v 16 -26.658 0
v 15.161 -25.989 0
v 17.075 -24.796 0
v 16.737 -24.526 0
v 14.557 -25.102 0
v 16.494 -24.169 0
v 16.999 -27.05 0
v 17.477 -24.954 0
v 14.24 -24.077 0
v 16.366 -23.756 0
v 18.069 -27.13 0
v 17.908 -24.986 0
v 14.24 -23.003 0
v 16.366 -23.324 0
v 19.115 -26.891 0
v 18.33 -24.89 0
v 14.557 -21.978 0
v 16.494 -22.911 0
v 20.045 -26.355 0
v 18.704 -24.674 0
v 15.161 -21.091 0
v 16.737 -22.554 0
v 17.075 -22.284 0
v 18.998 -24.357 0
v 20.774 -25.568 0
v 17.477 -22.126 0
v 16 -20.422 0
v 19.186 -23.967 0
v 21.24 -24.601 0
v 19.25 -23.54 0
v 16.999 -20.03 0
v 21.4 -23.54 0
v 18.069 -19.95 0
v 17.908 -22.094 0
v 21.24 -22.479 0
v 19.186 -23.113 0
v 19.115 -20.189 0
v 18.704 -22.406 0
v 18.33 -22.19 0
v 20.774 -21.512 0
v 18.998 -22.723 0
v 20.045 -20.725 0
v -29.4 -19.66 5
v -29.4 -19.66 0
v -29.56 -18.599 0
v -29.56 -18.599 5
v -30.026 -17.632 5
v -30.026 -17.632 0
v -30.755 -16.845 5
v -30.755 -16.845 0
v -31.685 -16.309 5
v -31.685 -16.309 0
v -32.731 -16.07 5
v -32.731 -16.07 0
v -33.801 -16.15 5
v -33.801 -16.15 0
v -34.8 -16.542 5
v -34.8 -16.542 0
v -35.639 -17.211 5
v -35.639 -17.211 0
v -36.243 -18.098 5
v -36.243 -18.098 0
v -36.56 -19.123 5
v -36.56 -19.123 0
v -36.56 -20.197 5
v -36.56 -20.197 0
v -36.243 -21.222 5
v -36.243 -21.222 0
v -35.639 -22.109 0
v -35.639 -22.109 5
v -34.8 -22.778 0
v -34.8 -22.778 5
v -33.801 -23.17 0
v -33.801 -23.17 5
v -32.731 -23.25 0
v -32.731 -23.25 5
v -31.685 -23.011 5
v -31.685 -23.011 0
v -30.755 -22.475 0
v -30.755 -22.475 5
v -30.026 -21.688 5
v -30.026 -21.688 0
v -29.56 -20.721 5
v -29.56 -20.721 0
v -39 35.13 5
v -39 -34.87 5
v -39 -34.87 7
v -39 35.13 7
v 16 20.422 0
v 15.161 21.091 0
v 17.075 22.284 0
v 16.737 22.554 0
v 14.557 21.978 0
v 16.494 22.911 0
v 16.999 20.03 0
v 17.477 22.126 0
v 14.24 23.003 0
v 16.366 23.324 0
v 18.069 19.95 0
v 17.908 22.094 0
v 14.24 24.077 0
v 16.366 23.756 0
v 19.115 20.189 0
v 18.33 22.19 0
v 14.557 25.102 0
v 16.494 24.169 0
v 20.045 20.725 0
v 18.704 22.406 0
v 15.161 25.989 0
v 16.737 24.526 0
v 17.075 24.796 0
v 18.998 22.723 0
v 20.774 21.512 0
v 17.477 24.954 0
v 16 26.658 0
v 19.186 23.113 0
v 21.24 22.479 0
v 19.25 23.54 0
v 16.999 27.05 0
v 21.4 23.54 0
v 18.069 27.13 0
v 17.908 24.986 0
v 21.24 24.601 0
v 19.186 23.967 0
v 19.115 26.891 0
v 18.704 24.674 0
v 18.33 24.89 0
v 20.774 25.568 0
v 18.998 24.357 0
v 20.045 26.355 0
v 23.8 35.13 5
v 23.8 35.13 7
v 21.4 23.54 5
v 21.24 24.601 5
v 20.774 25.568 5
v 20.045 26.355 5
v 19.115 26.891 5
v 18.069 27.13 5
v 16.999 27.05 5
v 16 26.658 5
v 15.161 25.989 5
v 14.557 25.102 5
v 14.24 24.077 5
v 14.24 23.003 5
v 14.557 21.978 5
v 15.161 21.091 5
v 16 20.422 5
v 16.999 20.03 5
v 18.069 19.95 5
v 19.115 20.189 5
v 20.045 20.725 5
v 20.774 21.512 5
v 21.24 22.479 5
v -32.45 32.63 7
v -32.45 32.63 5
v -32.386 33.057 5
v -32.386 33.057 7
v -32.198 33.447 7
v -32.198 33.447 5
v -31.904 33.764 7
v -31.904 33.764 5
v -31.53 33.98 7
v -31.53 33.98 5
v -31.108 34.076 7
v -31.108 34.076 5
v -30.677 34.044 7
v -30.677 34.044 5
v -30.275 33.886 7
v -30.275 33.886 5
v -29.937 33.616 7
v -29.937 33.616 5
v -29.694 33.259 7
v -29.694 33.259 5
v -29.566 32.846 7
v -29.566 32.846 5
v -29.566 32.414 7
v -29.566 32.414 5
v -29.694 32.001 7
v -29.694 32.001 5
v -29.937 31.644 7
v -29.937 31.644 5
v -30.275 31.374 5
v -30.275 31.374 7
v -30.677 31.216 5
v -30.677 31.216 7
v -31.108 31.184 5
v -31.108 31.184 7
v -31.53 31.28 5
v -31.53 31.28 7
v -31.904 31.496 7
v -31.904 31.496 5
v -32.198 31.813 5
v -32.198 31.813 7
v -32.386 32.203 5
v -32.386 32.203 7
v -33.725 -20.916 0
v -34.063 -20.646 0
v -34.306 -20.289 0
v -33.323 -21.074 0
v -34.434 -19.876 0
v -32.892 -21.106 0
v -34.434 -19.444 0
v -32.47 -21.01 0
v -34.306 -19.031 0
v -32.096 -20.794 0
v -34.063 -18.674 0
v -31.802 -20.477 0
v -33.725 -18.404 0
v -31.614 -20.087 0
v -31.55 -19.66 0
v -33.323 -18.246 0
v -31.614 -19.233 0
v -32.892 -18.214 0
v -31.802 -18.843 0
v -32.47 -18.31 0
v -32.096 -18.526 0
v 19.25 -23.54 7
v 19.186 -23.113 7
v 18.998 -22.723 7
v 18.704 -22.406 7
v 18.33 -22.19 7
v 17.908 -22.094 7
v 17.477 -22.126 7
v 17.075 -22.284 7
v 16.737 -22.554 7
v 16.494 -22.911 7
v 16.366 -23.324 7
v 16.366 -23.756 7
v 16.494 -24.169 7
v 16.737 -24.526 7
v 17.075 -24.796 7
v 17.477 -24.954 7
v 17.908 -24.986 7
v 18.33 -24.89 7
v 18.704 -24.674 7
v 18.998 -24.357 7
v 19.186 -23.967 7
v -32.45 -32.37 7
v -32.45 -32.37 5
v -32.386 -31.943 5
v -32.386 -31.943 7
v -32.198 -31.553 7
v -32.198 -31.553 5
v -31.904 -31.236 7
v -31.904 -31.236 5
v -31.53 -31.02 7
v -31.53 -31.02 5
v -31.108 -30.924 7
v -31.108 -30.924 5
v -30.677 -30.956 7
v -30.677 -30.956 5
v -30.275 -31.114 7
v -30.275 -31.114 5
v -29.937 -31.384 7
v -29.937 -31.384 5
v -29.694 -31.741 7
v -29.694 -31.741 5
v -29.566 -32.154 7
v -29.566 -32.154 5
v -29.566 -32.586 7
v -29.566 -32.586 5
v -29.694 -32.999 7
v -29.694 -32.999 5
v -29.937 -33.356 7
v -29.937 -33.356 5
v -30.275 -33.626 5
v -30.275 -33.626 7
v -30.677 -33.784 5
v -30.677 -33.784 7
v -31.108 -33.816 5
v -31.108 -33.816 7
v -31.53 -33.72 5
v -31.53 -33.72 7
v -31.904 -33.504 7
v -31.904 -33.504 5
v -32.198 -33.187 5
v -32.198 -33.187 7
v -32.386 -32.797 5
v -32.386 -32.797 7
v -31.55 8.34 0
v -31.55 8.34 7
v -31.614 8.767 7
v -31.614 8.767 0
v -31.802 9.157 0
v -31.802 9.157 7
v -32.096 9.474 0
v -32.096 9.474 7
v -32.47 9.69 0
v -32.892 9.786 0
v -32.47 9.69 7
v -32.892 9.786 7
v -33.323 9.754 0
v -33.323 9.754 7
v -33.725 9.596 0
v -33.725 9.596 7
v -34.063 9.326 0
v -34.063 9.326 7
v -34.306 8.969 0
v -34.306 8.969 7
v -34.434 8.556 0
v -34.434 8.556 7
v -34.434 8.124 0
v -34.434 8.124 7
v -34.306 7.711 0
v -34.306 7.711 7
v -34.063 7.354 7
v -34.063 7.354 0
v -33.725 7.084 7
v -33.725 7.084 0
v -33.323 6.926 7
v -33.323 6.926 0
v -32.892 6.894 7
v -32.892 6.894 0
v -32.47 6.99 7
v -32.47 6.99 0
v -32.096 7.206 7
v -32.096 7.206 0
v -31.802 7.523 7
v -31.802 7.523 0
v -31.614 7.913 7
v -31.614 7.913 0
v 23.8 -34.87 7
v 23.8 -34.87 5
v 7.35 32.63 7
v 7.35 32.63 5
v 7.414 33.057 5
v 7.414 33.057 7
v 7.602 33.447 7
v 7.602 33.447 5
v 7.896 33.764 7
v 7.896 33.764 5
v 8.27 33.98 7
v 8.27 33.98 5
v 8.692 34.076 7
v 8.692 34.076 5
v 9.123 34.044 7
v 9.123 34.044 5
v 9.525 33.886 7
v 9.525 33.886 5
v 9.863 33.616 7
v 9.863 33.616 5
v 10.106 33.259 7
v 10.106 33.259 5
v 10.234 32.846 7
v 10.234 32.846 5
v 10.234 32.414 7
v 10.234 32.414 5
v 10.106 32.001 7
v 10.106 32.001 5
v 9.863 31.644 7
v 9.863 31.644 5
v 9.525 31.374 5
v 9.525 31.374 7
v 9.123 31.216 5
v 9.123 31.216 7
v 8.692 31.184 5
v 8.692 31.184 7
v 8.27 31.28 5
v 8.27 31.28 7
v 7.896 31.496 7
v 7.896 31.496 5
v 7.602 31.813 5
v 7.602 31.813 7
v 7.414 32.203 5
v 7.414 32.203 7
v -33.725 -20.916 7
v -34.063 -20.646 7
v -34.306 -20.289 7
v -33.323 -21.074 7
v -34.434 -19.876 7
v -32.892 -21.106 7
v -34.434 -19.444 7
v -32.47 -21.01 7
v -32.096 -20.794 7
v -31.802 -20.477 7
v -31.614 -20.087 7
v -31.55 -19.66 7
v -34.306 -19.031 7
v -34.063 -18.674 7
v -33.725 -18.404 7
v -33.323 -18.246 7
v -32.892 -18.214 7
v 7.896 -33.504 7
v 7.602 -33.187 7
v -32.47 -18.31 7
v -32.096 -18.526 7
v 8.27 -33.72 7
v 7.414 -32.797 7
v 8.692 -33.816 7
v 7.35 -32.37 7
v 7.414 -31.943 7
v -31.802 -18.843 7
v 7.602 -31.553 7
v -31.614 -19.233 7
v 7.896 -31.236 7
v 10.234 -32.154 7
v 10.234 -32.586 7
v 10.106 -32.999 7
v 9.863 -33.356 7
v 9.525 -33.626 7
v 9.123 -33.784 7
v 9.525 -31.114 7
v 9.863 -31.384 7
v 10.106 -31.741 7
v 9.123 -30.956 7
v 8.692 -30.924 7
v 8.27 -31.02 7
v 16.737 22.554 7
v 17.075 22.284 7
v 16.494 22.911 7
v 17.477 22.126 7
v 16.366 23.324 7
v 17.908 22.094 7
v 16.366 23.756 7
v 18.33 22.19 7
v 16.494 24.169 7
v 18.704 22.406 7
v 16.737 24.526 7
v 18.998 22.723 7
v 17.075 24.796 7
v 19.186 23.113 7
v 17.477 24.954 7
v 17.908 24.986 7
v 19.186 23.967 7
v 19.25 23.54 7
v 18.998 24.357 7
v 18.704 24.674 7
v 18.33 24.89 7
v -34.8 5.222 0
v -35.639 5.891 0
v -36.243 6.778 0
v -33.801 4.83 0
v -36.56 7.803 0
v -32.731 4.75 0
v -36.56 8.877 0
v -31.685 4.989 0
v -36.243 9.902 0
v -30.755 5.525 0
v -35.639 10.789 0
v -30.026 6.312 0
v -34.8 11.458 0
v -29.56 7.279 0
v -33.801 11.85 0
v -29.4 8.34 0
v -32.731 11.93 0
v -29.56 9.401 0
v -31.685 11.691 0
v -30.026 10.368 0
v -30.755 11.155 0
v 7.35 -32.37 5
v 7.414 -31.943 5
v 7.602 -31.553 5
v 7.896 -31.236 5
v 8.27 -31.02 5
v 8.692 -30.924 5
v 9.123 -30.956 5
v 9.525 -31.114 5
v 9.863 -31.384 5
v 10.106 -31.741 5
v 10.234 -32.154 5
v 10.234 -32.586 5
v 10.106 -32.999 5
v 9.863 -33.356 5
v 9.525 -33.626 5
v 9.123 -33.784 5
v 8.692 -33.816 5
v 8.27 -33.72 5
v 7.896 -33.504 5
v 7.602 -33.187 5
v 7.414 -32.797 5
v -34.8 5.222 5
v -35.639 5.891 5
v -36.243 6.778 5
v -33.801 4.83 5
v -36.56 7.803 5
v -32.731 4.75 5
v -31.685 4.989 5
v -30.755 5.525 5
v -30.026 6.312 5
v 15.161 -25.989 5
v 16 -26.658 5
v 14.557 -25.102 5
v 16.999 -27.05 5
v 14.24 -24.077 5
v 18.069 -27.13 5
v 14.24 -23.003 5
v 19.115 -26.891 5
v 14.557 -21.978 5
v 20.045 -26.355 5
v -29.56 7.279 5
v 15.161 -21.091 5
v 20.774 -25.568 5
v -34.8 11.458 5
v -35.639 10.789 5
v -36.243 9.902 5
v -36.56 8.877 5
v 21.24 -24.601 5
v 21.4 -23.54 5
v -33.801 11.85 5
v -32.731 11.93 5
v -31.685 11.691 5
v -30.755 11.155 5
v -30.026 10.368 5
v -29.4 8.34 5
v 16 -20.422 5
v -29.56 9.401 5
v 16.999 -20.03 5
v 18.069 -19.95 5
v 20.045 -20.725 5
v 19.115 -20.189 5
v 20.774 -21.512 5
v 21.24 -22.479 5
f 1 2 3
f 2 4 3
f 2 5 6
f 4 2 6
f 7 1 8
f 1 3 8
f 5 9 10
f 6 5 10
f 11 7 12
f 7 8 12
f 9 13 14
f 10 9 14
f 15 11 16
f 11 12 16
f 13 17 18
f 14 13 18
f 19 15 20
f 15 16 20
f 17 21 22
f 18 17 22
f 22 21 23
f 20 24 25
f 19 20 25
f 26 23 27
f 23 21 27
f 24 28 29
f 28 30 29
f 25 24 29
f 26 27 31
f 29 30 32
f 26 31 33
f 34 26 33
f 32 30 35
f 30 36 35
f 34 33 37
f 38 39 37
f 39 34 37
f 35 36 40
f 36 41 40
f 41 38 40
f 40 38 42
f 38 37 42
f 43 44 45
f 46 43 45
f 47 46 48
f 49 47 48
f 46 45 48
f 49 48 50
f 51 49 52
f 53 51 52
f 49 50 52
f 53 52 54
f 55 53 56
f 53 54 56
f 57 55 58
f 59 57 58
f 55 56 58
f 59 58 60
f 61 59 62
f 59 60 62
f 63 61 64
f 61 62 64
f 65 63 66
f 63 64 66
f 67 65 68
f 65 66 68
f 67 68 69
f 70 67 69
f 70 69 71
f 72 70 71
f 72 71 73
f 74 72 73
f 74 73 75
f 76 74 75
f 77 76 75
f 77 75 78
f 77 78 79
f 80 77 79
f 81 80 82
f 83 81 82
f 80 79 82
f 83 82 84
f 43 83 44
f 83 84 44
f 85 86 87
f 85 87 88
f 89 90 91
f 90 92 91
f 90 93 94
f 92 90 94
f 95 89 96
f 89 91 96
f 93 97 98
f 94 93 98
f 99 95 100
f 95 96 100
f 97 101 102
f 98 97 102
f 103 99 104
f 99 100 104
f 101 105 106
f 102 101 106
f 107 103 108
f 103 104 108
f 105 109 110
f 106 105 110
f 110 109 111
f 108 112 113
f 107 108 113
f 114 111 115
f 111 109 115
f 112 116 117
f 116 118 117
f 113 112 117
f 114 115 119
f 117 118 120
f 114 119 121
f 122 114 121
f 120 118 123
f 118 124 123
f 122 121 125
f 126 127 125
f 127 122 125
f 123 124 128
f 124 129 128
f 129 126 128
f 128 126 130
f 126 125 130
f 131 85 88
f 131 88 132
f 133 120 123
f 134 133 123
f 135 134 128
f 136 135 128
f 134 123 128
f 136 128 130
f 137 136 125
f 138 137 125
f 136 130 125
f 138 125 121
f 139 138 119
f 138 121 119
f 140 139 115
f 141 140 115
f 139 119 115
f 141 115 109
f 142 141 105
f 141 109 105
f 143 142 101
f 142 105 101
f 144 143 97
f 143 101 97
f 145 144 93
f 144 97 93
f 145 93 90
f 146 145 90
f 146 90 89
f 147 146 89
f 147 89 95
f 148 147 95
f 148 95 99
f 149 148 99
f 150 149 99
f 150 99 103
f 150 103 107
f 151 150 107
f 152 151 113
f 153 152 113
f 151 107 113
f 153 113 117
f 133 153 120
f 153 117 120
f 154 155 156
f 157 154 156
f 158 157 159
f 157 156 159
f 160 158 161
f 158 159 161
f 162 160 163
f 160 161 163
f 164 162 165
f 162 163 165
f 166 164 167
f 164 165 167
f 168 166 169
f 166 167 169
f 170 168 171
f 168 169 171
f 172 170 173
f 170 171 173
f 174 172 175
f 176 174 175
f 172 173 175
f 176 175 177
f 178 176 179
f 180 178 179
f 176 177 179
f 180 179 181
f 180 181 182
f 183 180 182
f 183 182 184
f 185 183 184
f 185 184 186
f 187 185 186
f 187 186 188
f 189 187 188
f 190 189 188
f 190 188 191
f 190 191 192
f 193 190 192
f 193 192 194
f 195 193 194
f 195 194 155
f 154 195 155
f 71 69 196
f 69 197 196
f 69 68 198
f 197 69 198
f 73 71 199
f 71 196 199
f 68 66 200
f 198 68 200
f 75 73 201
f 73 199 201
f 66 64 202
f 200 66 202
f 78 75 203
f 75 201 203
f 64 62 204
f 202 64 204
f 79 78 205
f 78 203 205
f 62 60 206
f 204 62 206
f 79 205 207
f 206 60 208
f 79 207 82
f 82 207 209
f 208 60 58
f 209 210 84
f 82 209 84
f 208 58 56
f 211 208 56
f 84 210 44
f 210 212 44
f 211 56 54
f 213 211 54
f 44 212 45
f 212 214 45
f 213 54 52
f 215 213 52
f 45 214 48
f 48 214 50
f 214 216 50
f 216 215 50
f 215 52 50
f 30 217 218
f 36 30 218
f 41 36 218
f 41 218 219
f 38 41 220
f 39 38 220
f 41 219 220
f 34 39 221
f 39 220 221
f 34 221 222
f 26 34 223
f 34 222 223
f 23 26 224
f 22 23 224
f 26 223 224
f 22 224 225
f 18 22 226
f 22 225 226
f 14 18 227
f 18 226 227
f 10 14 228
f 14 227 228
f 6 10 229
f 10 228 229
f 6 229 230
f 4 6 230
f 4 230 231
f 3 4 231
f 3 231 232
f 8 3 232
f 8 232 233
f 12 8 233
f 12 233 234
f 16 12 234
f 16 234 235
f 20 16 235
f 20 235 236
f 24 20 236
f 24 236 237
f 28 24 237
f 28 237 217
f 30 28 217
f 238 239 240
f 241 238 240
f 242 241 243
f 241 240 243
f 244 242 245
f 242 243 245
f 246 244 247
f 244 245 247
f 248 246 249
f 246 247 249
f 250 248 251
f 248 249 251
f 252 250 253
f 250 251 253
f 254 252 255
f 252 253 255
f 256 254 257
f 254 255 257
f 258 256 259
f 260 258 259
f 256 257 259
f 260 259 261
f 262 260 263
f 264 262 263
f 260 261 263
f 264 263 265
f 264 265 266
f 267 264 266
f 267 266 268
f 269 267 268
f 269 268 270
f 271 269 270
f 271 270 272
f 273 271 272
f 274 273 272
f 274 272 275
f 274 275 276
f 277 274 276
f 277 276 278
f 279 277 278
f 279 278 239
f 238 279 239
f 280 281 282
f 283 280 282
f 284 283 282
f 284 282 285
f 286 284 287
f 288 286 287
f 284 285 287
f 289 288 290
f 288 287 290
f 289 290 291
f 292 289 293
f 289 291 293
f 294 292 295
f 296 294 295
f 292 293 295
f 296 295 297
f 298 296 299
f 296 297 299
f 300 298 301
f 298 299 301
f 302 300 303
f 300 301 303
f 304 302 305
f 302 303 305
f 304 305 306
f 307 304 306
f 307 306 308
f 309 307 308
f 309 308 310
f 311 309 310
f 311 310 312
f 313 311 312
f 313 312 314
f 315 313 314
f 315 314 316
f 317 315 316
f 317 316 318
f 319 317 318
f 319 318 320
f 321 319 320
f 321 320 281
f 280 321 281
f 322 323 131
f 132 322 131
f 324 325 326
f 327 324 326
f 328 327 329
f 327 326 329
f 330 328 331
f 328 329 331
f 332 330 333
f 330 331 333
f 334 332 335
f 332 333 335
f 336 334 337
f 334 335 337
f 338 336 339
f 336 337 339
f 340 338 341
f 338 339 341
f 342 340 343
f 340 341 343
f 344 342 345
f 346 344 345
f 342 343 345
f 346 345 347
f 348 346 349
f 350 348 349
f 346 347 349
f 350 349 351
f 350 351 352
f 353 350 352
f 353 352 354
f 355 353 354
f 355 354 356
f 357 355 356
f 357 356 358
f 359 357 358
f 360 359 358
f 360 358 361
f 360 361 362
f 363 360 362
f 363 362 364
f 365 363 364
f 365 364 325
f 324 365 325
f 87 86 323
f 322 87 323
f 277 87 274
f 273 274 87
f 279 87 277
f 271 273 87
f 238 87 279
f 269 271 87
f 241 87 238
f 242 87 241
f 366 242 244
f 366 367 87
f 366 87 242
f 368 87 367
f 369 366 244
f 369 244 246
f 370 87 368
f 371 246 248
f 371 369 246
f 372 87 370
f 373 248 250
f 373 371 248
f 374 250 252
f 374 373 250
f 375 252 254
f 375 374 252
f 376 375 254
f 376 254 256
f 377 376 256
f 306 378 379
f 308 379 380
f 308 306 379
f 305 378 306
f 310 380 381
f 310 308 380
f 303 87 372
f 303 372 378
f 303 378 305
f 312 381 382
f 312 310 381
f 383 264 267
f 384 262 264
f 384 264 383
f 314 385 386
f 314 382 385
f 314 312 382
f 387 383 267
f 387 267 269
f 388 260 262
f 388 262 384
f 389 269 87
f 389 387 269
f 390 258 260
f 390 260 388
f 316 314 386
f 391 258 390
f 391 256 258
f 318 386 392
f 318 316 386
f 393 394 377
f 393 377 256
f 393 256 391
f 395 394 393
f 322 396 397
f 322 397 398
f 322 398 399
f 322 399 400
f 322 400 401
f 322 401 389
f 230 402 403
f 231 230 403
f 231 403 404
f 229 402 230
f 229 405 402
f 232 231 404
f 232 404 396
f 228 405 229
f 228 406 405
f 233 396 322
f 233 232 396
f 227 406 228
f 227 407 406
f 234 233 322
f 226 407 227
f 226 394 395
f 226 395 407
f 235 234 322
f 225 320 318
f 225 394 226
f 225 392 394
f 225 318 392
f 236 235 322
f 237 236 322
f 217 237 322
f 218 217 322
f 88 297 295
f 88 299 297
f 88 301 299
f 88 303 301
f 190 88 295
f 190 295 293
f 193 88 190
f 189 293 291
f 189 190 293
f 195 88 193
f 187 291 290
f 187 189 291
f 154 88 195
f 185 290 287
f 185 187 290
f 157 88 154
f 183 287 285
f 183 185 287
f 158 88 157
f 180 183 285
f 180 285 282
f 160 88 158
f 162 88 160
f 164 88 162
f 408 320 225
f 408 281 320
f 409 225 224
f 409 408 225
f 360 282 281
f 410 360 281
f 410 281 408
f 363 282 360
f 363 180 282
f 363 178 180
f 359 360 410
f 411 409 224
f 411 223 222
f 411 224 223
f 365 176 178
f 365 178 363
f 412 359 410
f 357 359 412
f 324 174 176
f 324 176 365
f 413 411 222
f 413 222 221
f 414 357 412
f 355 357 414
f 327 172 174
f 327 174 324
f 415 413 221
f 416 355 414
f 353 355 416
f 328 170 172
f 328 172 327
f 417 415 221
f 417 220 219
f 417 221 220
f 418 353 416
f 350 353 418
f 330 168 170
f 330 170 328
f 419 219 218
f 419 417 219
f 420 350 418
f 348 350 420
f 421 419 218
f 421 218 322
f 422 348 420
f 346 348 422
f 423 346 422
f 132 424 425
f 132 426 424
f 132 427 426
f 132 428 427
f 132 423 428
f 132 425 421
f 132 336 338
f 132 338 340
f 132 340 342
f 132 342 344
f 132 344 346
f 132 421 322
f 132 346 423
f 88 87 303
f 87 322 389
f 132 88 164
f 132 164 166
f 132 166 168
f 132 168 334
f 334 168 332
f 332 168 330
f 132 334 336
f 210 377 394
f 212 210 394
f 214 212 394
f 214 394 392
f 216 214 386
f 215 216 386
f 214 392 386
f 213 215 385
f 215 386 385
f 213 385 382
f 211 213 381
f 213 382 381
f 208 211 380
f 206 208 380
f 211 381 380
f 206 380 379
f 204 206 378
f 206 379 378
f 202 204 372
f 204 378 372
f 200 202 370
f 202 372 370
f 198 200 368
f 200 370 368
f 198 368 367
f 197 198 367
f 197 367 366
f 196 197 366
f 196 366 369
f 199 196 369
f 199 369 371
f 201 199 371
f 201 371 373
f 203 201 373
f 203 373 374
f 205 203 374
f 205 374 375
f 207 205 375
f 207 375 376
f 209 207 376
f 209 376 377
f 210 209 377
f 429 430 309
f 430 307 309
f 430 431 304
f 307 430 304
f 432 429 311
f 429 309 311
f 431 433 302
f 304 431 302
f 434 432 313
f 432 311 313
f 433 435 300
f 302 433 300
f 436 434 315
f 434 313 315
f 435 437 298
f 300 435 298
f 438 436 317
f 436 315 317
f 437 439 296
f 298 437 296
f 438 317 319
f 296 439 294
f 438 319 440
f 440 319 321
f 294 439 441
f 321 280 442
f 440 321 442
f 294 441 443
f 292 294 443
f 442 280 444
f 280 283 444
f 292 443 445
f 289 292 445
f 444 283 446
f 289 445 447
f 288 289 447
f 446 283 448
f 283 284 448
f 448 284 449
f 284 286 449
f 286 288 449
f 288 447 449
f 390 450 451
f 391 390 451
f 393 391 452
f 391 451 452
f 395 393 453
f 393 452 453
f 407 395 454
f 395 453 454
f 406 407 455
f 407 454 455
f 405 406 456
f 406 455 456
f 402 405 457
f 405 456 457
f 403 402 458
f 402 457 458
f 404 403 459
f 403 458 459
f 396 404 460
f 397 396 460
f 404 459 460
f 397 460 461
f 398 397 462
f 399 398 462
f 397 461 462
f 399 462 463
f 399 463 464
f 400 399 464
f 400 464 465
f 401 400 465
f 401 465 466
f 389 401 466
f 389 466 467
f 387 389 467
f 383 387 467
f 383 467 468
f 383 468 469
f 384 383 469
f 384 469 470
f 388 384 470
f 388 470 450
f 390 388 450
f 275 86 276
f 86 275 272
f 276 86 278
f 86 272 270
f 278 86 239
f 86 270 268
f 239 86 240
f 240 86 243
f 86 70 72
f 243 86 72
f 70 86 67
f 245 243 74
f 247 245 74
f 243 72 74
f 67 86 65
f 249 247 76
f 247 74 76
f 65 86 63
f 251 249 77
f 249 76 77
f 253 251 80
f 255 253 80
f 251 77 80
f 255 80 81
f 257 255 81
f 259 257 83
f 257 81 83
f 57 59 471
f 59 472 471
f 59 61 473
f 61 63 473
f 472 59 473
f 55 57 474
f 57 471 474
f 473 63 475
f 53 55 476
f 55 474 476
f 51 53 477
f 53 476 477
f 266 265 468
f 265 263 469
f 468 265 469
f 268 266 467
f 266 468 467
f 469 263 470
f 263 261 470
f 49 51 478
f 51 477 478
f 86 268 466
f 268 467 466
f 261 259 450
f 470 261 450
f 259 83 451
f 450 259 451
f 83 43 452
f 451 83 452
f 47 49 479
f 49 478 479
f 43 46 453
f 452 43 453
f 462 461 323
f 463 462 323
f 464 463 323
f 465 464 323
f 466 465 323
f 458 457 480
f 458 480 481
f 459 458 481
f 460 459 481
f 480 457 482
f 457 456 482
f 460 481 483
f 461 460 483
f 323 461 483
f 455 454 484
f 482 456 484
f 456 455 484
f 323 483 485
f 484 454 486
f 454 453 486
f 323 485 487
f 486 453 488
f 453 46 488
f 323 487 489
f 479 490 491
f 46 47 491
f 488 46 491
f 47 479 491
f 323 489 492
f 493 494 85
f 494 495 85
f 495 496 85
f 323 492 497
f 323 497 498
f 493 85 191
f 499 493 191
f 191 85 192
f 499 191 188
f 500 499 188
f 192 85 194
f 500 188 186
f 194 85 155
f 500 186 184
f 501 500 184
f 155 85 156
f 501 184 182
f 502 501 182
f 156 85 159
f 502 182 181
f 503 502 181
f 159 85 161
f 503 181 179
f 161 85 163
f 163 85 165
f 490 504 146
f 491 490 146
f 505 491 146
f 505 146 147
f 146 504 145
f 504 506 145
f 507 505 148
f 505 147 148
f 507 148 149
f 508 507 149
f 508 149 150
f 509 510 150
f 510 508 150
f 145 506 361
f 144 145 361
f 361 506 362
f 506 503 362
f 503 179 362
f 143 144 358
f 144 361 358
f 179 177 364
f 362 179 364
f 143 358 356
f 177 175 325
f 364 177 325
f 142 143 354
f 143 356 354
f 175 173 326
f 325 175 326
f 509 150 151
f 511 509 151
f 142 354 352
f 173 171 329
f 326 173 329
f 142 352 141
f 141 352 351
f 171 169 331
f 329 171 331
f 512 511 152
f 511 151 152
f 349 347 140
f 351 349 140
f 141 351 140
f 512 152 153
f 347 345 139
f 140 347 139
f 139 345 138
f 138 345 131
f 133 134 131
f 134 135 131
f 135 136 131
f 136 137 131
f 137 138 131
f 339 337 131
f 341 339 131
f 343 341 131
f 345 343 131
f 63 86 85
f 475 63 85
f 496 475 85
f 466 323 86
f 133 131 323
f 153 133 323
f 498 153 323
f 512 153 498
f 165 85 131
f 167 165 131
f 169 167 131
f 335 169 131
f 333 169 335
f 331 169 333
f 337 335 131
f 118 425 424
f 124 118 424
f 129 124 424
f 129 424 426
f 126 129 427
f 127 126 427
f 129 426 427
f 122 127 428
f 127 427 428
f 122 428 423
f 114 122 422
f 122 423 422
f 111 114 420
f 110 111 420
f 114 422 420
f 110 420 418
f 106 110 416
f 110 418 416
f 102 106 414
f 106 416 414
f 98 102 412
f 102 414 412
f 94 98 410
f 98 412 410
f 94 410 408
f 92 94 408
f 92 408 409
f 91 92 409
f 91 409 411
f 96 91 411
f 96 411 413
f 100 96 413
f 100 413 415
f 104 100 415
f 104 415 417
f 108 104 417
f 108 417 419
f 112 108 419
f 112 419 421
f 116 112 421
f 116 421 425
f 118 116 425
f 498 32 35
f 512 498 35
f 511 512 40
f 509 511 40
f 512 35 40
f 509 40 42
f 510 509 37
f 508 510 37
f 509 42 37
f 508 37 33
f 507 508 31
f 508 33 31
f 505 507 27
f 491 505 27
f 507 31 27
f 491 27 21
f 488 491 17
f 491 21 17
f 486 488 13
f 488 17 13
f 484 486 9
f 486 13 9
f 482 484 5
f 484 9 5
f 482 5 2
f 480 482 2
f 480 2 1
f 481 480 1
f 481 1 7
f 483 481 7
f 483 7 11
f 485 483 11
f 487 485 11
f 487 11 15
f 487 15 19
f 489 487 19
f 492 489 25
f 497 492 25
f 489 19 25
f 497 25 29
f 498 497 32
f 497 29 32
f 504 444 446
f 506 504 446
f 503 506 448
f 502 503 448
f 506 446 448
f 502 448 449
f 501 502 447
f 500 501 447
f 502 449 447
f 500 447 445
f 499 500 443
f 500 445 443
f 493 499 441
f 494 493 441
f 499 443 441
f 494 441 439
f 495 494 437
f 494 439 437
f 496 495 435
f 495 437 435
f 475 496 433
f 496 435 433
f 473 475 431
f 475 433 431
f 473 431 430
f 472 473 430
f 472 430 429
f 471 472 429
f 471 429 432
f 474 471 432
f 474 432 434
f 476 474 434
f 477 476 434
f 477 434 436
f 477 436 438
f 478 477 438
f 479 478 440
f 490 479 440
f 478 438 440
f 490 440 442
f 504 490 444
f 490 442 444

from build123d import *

# Parameters (mm, degrees)
SKETCH1_R                 = 3.6
SKETCH1_R_2               = 1.6
BOSS_EXTRUDE1_DEPTH       = 5
SKETCH2_W                 = 62.8
SKETCH2_H                 = 70
BOSS_EXTRUDE2_DEPTH       = 2
F_1_0MM_DOWEL_HOLE2_D     = 2.9
F_1_0MM_DOWEL_HOLE2_DEPTH = 9.128752102
F_1_0MM_DOWEL_HOLE2_TIP   = 0.871247898
F_1_0MM_DOWEL_HOLE3_D     = 2.9
F_1_0MM_DOWEL_HOLE3_DEPTH = 9.128752102
F_1_0MM_DOWEL_HOLE3_TIP   = 0.871247898


with BuildPart() as part:
    # Sketch1 → Boss-Extrude1 (new body)
    with BuildSketch(Plane.XY):
        with Locations((-33, -19.66)):
            Circle(SKETCH1_R)
        with Locations((-33, -19.66)):
            Circle(SKETCH1_R_2, mode=Mode.SUBTRACT)
        with Locations((-33, -19.66)):
            Circle(SKETCH1_R_2)
        with Locations((-33, 8.34)):
            Circle(SKETCH1_R)
        with Locations((17.8, -23.54)):
            Circle(SKETCH1_R)
        with Locations((17.8, 23.54)):
            Circle(SKETCH1_R)
    extrude(amount=BOSS_EXTRUDE1_DEPTH)

    # Sketch2 → Boss-Extrude2 (add)
    with BuildSketch(Plane.XY.offset(5)):
        with Locations((-7.6, 0.13)):
            Rectangle(SKETCH2_W, SKETCH2_H)
    extrude(amount=BOSS_EXTRUDE2_DEPTH)

    # Ø1.0mm Dowel Hole2
    with Locations(Plane(origin=(8.8, -32.37, 7), x_dir=(1, 0, 0), z_dir=(0, 0, 1))):
        with Locations((0, 0), (-39.8, 0), (-39.8, 65), (0, 65)):
            Hole(F_1_0MM_DOWEL_HOLE2_D / 2, depth=F_1_0MM_DOWEL_HOLE2_DEPTH)
            with Locations((0, 0, -(F_1_0MM_DOWEL_HOLE2_DEPTH + F_1_0MM_DOWEL_HOLE2_TIP / 2))):  # 118° drill point
                Cone(0, F_1_0MM_DOWEL_HOLE2_D / 2, F_1_0MM_DOWEL_HOLE2_TIP, mode=Mode.SUBTRACT)

    # Ø1.0mm Dowel Hole3
    with Locations(Plane(origin=(17.8, 23.54, 0), x_dir=(-1, 0, 0), z_dir=(0, 0, -1))):
        with Locations((0, 0), (50.8, -15.2), (50.8, -43.2), (0, -47.08)):
            Hole(F_1_0MM_DOWEL_HOLE3_D / 2, depth=F_1_0MM_DOWEL_HOLE3_DEPTH)
            with Locations((0, 0, -(F_1_0MM_DOWEL_HOLE3_DEPTH + F_1_0MM_DOWEL_HOLE3_TIP / 2))):  # 118° drill point
                Cone(0, F_1_0MM_DOWEL_HOLE3_D / 2, F_1_0MM_DOWEL_HOLE3_TIP, mode=Mode.SUBTRACT)


solid = part.part
